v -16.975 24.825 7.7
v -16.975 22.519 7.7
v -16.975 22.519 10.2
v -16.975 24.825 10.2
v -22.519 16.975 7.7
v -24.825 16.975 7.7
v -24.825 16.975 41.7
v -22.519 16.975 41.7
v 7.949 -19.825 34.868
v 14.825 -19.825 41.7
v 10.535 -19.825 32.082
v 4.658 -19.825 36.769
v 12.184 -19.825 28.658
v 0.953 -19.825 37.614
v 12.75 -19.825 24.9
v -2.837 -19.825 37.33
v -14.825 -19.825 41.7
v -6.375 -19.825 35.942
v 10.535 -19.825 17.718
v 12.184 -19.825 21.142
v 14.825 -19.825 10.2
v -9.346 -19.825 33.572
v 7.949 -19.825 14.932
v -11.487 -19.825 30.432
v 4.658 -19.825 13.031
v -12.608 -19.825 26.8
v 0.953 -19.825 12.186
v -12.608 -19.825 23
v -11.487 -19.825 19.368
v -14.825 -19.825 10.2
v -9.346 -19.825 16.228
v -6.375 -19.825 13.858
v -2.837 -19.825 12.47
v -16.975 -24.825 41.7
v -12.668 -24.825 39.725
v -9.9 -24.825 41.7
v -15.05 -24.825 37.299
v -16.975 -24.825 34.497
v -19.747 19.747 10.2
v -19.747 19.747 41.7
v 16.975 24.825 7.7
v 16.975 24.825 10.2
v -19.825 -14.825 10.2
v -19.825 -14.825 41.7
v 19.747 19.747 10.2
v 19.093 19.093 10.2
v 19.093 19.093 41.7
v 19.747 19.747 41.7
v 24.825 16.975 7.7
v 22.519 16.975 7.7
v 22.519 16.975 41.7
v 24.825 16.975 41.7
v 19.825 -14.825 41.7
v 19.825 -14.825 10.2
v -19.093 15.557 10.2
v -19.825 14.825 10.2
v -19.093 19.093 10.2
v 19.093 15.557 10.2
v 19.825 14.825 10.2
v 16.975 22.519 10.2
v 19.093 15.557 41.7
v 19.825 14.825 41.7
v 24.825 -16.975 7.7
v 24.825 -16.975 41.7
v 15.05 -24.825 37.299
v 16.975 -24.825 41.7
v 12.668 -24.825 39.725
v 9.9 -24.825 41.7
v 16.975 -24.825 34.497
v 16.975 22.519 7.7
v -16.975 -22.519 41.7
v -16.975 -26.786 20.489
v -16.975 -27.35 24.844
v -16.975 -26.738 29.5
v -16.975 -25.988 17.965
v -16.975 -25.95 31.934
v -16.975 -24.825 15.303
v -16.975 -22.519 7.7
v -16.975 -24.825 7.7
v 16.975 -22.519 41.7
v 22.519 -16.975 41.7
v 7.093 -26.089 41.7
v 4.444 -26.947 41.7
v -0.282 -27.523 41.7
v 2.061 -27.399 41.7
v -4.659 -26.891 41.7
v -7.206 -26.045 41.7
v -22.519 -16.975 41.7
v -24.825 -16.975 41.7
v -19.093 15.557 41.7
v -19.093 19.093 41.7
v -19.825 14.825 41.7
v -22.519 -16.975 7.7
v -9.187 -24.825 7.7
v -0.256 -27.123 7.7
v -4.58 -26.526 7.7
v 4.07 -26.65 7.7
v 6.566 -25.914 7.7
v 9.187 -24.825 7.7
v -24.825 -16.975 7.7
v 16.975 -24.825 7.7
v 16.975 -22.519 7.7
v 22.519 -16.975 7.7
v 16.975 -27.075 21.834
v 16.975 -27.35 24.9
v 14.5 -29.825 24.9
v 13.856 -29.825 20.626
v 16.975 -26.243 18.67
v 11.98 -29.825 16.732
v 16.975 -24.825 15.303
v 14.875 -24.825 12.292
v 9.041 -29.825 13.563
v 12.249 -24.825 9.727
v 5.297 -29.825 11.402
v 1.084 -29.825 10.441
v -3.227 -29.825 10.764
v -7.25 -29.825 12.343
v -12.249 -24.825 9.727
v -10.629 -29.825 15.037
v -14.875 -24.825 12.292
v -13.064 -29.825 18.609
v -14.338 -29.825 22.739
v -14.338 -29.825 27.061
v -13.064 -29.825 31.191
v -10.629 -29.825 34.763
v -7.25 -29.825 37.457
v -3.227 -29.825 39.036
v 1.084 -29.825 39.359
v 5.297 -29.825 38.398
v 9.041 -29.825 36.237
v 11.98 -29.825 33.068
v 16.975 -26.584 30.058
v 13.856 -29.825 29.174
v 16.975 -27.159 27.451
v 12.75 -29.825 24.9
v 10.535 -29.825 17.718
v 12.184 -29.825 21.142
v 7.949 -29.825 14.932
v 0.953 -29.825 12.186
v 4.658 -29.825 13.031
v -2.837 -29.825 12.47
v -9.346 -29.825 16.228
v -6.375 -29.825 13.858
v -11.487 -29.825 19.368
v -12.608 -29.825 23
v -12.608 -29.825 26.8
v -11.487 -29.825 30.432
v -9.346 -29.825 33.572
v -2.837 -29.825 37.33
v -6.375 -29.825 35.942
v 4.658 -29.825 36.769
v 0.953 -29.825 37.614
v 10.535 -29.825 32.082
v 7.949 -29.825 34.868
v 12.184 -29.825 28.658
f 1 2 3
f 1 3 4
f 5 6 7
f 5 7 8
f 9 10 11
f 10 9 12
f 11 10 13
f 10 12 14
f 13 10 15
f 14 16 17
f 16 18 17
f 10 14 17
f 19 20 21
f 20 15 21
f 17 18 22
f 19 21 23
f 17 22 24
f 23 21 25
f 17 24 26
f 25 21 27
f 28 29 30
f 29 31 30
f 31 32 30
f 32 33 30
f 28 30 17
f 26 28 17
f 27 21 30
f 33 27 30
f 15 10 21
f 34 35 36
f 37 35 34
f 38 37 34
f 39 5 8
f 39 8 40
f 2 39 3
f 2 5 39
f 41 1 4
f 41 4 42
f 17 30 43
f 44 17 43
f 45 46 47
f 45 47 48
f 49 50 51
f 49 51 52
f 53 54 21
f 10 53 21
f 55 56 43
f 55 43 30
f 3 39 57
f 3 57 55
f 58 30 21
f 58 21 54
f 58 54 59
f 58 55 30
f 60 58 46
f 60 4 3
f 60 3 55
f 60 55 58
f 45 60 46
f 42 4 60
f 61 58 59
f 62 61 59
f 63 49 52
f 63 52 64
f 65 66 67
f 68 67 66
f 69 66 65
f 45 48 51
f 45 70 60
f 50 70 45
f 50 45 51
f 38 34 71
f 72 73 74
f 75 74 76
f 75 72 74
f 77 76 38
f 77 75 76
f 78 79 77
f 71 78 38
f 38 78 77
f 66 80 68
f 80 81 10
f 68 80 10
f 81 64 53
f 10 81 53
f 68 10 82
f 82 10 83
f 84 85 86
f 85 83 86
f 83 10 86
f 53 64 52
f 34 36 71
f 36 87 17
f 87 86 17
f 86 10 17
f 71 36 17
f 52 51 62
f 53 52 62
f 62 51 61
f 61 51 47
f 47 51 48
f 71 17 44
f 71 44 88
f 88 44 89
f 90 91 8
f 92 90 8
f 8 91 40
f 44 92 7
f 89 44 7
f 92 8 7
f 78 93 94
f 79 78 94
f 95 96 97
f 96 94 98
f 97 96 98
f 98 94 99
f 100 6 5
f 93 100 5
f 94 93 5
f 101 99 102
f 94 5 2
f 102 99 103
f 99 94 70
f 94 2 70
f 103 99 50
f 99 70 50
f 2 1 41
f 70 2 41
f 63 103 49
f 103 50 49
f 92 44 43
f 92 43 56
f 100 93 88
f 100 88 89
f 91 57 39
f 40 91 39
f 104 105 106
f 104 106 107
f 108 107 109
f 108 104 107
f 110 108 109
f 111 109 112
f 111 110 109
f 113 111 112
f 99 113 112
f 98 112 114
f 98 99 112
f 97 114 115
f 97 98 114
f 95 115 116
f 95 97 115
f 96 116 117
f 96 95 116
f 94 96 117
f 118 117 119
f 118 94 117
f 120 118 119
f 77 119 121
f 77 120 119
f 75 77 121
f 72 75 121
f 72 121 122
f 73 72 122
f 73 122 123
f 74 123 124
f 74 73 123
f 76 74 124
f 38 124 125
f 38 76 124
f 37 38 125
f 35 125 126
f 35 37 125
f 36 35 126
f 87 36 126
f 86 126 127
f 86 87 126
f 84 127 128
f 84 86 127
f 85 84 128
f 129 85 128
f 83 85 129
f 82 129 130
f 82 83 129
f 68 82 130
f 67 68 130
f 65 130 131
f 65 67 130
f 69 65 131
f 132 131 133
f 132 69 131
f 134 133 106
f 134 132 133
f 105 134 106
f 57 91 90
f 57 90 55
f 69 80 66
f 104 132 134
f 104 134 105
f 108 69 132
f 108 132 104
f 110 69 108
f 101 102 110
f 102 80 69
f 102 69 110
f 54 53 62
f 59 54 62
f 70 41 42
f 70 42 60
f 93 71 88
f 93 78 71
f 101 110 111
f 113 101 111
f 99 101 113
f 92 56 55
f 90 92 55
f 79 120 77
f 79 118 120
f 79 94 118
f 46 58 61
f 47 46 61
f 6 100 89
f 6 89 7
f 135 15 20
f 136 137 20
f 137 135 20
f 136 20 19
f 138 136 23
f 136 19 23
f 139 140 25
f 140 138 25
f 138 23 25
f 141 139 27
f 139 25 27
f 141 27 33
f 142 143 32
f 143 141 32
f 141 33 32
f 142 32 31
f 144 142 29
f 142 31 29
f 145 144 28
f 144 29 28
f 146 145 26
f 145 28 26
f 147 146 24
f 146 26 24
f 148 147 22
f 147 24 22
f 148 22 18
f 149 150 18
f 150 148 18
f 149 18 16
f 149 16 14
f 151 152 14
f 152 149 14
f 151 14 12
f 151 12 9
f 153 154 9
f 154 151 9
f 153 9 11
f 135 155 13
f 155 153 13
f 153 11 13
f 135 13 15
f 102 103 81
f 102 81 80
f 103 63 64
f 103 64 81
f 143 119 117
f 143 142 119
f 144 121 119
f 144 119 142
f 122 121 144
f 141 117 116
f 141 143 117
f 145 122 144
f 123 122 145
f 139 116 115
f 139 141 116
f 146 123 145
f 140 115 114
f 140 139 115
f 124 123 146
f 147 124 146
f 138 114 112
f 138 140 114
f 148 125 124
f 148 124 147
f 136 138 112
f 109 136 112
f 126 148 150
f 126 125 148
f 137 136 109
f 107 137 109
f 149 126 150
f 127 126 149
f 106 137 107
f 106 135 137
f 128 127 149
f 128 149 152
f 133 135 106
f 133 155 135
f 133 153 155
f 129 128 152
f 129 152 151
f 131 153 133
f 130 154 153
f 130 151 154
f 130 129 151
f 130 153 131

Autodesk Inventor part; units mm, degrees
ref_plane "YZ Plane" through (0, 0, 0) normal (1, 0, 0) x (0, 1, 0)
ref_plane "XZ Plane" through (0, 0, 0) normal (0, 1, 0) x (-1, 0, 0)
sketch "Sketch1" plane through (0, 0, 0) normal (0, 0, 1) x (1, 0, 0)
  circle A0 centre (-10, 20.9) radius 1.875 projected
  circle A1 centre (-10, -20.9) radius 1.875 projected
  circle A2 centre (10, 20.9) radius 1.875 projected
  circle A3 centre (10, -20.9) radius 1.875 projected
  circle A4 centre (20.8, -14.4) radius 2.075 projected
  circle A5 centre (20.8, 14.4) radius 2.075 projected
  circle A6 centre (-20.8, 14.4) radius 2.075 projected
  circle A7 centre (-20.8, -14.4) radius 2.075 projected
  line L0 (16.9, -16.9) -> (-16.9, -16.9) projected
  line L1 (-16.9, -16.9) -> (-16.9, 16.9) projected
  line L2 (-16.9, 16.9) -> (16.9, 16.9) projected
  line L3 (16.9, 16.9) -> (16.9, -16.9) projected
  line L4 (-17.05, 24.9) -> (-17.05, 22.55) projected
  line L5 (-17.05, 22.55) -> (-22.55, 17.05) projected
  line L6 (-22.55, 17.05) -> (-24.9, 17.05) projected
  line L7 (-24.9, 17.05) -> (-24.9, -17.05) projected
  line L8 (-24.9, -17.05) -> (-22.55, -17.05) projected
  line L9 (-22.55, -17.05) -> (-17.05, -22.55) projected
  line L10 (-17.05, -22.55) -> (-17.05, -24.9) projected
  line L11 (-17.05, -24.9) -> (17.05, -24.9) projected
  line L12 (17.05, -24.9) -> (17.05, -22.55) projected
  line L13 (17.05, -22.55) -> (22.55, -17.05) projected
  line L14 (22.55, -17.05) -> (24.9, -17.05) projected
  line L15 (24.9, -17.05) -> (24.9, 17.05) projected
  line L16 (24.9, 17.05) -> (22.55, 17.05) projected
  line L17 (22.55, 17.05) -> (17.05, 22.55) projected
  line L18 (17.05, 22.55) -> (17.05, 24.9) projected
  line L19 (17.05, 24.9) -> (-17.05, 24.9) projected
  line L20 (24.825, 16.975) -> (24.825, -16.975)
  line L21 (24.825, -16.975) -> (22.5189, -16.975)
  line L22 (22.5189, -16.975) -> (16.975, -22.5189)
  line L23 (16.975, -22.5189) -> (16.975, -24.825)
  line L24 (16.975, -24.825) -> (-16.975, -24.825)
  line L25 (-16.975, -24.825) -> (-16.975, -22.5189)
  line L26 (-16.975, -22.5189) -> (-22.5189, -16.975)
  line L27 (-22.5189, -16.975) -> (-24.825, -16.975)
  line L28 (-24.825, -16.975) -> (-24.825, 16.975)
  line L29 (-24.825, 16.975) -> (-22.5189, 16.975)
  line L30 (-22.5189, 16.975) -> (-16.975, 22.5189)
  line L31 (-16.975, 22.5189) -> (-16.975, 24.825)
  line L32 (-16.975, 24.825) -> (16.975, 24.825)
  line L33 (16.975, 24.825) -> (16.975, 22.5189)
  line L34 (16.975, 22.5189) -> (22.5189, 16.975)
  line L35 (22.5189, 16.975) -> (24.825, 16.975)
  point P0 (0, 0)
  dimension "d0" = 0.075
ref_plane "Work Plane1" through (-24.9, -24.9, 7.7) normal (0, 0, 1) x (1, 0, 0)
extrude "Extrusion1" add sketch "Sketch1" along normal blind 2.5 from surface at 7.7 contours A0 | A1 | A2 | A3 | A4 | A5 | A6 | A7 | L0 L1 L2 L3 | L20 L21 L22 L23 L24 L25 L26 L27 L28 L29 L30 L31 L32 L33 L34 L35
sketch "Sketch2" plane through (0, 0, 0) normal (0, 0, 1) x (1, 0, 0)
  line L0 (22.5189, 16.975) -> (24.825, 16.975) projected
  line L1 (16.975, 22.5189) -> (22.5189, 16.975) projected
  line L2 (16.975, 24.825) -> (16.975, 22.5189) projected
  line L3 (-16.975, 24.825) -> (16.975, 24.825) projected
  line L4 (-16.975, 22.5189) -> (-16.975, 24.825) projected
  line L5 (-22.5189, 16.975) -> (-16.975, 22.5189) projected
  line L6 (-24.825, 16.975) -> (-22.5189, 16.975) projected
  line L7 (-24.825, -16.975) -> (-24.825, 16.975) projected
  line L8 (-22.5189, -16.975) -> (-24.825, -16.975) projected
  line L9 (-16.975, -22.5189) -> (-22.5189, -16.975) projected
  line L10 (-16.975, -24.825) -> (-16.975, -22.5189) projected
  line L11 (16.975, -24.825) -> (-16.975, -24.825) projected
  line L12 (16.975, -22.5189) -> (16.975, -24.825) projected
  line L13 (22.5189, -16.975) -> (16.975, -22.5189) projected
  line L14 (24.825, -16.975) -> (22.5189, -16.975) projected
  line L15 (24.825, 16.975) -> (24.825, -16.975) projected
  line L16 (24.825, -16.975) -> (24.825, -24.825)
  line L17 (24.825, -24.825) -> (16.975, -24.825)
  line L18 (24.825, -24.825) -> (14.825, -24.825)
  line L19 (14.825, -24.825) -> (14.825, -19.825)
  line L20 (19.825, -14.825) -> (24.825, -14.825)
  line L21 (24.825, -14.825) -> (24.825, -24.825)
  line L22 (19.825, -14.825) -> (14.825, -19.825)
  line L23 (14.825, 19.825) -> (19.825, 14.825)
  line L24 (14.825, 19.825) -> (14.825, 24.825)
  line L25 (14.825, 24.825) -> (24.825, 24.825)
  line L26 (24.825, 24.825) -> (24.825, 14.825)
  line L27 (24.825, 14.825) -> (19.825, 14.825)
  line L28 (-19.825, 14.825) -> (-14.825, 19.825)
  line L29 (-19.825, 14.825) -> (-24.825, 14.825)
  line L30 (-24.825, 14.825) -> (-24.825, 24.825)
  line L31 (-24.825, 24.825) -> (-14.825, 24.825)
  line L32 (-14.825, 24.825) -> (-14.825, 19.825)
  line L33 (-14.825, -19.825) -> (-19.825, -14.825)
  line L34 (-14.825, -19.825) -> (-14.825, -24.825)
  line L35 (-14.825, -24.825) -> (-24.825, -24.825)
  line L36 (-24.825, -24.825) -> (-24.825, -14.825)
  line L37 (-24.825, -14.825) -> (-19.825, -14.825)
  line L38 (16.9, -16.9) -> (19.747, -19.747)
  line L39 (-16.9, -16.9) -> (-19.747, -19.747)
  circle A0 centre (20.8, -14.4) radius 2.075 projected
  circle A1 centre (20.8, 14.4) radius 2.075 projected
  circle A2 centre (-20.8, 14.4) radius 2.075 projected
  circle A3 centre (-20.8, -14.4) radius 2.075 projected
  line L40 (16.9, -16.9) -> (-16.9, -16.9) projected
  line L41 (16.9, 16.9) -> (16.9, -16.9) projected
  line L42 (-16.9, 16.9) -> (16.9, 16.9) projected
  line L43 (-16.9, -16.9) -> (-16.9, 16.9) projected
  line L44 (24.875, -22.9) -> (24.875, 22.9) projected
  arc A4 (22.9, -24.875) -> (24.875, -22.9) centre (22.9, -22.9) ccw projected
  line L45 (-22.9, -24.875) -> (22.9, -24.875) projected
  arc A5 (-24.875, -22.9) -> (-22.9, -24.875) centre (-22.9, -22.9) ccw projected
  line L46 (-24.875, 22.9) -> (-24.875, -22.9) projected
  arc A6 (-22.9, 24.875) -> (-24.875, 22.9) centre (-22.9, 22.9) ccw projected
  line L47 (22.9, 24.875) -> (-22.9, 24.875) projected
  arc A7 (24.875, 22.9) -> (22.9, 24.875) centre (22.9, 22.9) ccw projected
  line L48 (16.9, 16.9) -> (19.747, 19.747)
  line L49 (-16.9, 16.9) -> (-19.747, 19.747)
  line L50 (14.825, -19.825) -> (-14.825, -19.825)
  line L51 (19.825, -14.825) -> (19.825, 14.825)
  line L52 (-19.825, -14.825) -> (-19.825, 14.825)
  point P0 (0, 0)
  point P1 (14.825, -14.825)
  point P2 (17.325, -17.325)
  point P3 (-17.325, -17.325)
  point P4 (24.15, -14.825)
  point P5 (22.831, -14.825)
  point P6 (19.0838, -15.5662)
  point P7 (-19.0838, -15.5662)
  point P8 (-22.831, -14.825)
  point P9 (-24.15, -14.825)
  point P10 (-24.15, 14.825)
  point P11 (-22.831, 14.825)
  point P12 (-19.0838, 15.5662)
  point P13 (-14.825, 24.15)
  point P14 (14.825, 24.15)
  point P15 (19.0838, 15.5662)
  point P16 (22.831, 14.825)
  point P17 (24.15, 14.825)
  point P18 (-17.325, 17.325)
  point P19 (17.325, 17.325)
  point P20 (-23.3416, 24.825)
  point P21 (23.3416, 24.825)
  point P22 (-24.825, -23.3416)
  point P23 (-24.825, 23.3416)
  point P24 (23.3416, -24.825)
  point P25 (-23.3416, -24.825)
  point P26 (24.825, -23.3416)
  point P27 (24.825, 23.3416)
  dimension "d3" = 10
  dimension "d4" = 10
  dimension "d5" = 5
  dimension "d6" = 5
  dimension "d9" = 360
extrude "Extrusion2" add sketch "Sketch2" along normal blind 31.5 from surface at 10.2 contours L0 L15 L27 A1 L23 L48 L1 | L15 L20 A0 L51 A1 L27 | L15 L14 L13 L38 L22 A0 L20 | A1 L51 L27 | L27 L23 A1 | A0 L22 L20 | L20 L51 A0 | L38 L13 L12 L11 L19 L22 | L28 A2 L29 L7 L6 L5 L49 | L19 L11 L34 L50 | L39 L9 L8 L7 L37 A3 L33 | L33 L34 L11 L10 L9 L39 | L28 L29 A2 | A3 L37 L33 | L52 A2 L29 | A2 L52 A3 L37 L7 L29 | L37 A3 L52
chamfer "Chamfer1" distance 2.5 angle 45 2 edges at (17.325, 17.325, 25.95) (-17.325, 17.325, 25.95)
sketch "Sketch3" plane through (-16.975, -24.825, 7.7) normal (0, -1, 0) x (1, 0, 0)
  line L0 (-0.075, 0) -> (-0.075, 34.4) projected
  line L1 (34.025, 0) -> (34.025, 34.4) projected
  line L2 (-0.075, 17.2) -> (34.025, 17.2)
  circle A0 centre (16.975, 17.2) radius 12.75
  point P0 (16.975, -7.7)
  dimension "d16" = 25.5
extrude "Extrusion3" cut sketch "Sketch3" against normal up to surface (5 mm away)
sketch "Sketch4" plane through (-16.975, -24.825, 7.7) normal (0, -1, 0) x (1, 0, 0)
  line L0 (33.95, 34) -> (0, 34) projected
  line L1 (0, 0) -> (0, 34) projected
  line L2 (33.95, 0) -> (0, 0) projected
  line L3 (33.95, 0) -> (33.95, 34) projected
  circle A0 centre (16.975, 17.2) radius 14.5
  circle A1 centre (16.975, 17.2) radius 12.75 projected
  point P0 (16.975, -7.7)
  dimension "d25" = 1.75
extrude "Extrusion4" add sketch "Sketch4" along normal blind 5 contours A0
chamfer "Chamfer2" distance 5 angle 45 1 edges at (-14.5, -24.825, 24.9)
equation "\"d6\" = d5"
properties part number "Camera Mount Side"
